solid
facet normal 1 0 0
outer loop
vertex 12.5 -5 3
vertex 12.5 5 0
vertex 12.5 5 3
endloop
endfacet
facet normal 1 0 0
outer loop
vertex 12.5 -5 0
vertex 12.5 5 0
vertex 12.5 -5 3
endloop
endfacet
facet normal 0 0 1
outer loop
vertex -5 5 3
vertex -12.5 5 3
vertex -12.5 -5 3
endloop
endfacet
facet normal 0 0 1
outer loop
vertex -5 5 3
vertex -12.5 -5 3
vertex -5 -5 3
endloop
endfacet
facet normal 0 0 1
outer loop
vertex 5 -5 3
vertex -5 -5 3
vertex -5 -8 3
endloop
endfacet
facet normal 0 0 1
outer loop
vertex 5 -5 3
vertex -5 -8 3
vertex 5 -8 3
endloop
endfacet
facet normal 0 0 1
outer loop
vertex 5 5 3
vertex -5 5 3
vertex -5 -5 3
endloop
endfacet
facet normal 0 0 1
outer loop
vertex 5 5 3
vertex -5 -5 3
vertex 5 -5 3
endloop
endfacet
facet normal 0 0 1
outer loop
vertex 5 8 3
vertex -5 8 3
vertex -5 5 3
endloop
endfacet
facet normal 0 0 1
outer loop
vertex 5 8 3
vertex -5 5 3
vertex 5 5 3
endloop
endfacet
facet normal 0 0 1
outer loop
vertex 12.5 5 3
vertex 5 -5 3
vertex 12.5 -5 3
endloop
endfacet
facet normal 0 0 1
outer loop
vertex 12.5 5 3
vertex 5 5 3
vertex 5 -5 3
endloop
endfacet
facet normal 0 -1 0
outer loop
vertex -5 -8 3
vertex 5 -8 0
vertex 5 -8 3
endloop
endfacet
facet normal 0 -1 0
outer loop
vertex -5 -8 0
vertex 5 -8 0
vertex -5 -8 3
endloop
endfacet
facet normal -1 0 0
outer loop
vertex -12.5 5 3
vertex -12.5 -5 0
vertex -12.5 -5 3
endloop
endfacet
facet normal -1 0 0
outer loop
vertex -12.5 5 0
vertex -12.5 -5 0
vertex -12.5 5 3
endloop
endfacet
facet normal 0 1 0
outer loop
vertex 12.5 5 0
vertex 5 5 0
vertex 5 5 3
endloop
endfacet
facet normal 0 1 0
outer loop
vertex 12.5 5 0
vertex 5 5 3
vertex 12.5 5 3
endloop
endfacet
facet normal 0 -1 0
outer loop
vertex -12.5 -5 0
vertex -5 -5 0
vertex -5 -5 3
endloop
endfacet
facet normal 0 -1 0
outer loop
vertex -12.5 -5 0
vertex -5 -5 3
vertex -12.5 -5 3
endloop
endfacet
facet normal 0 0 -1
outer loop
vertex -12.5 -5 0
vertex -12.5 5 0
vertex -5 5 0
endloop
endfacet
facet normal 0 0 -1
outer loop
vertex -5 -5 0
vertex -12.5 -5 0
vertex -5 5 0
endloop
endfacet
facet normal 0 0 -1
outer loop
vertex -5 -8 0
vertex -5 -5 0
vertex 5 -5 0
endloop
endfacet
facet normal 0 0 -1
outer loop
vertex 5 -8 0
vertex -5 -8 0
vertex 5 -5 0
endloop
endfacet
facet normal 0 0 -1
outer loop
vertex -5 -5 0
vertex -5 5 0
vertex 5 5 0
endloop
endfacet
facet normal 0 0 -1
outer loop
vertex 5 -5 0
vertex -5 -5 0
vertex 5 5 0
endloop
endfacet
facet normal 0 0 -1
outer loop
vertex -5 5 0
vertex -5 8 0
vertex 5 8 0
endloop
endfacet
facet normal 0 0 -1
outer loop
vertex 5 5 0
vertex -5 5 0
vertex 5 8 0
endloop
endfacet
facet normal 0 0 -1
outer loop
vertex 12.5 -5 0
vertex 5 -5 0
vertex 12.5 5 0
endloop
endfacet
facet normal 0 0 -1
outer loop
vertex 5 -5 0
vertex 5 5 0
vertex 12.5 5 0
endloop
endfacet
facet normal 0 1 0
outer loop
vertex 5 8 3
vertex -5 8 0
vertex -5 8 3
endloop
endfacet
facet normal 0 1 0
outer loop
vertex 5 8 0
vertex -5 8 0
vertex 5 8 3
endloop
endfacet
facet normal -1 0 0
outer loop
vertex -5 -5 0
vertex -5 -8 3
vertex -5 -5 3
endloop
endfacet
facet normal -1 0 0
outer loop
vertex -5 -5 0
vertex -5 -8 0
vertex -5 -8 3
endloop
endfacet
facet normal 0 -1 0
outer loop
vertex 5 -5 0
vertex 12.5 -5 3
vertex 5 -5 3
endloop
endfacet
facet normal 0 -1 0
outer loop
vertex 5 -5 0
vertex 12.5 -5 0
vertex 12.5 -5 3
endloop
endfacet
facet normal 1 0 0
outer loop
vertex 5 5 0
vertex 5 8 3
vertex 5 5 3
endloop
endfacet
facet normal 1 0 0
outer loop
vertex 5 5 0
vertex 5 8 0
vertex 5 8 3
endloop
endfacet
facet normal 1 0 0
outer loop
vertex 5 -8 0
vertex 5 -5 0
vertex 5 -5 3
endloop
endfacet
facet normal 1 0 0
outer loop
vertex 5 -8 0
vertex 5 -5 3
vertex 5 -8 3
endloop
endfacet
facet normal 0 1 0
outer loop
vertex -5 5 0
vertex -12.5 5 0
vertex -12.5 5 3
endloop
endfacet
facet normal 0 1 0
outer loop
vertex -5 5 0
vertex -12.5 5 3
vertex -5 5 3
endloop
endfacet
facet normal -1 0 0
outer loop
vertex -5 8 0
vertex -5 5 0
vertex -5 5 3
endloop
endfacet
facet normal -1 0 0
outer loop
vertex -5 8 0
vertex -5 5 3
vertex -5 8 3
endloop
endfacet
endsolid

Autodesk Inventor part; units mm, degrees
ref_plane "YZ Plane" through (0, 0, 0) normal (1, 0, 0) x (0, 1, 0)
ref_plane "XZ Plane" through (0, 0, 0) normal (0, 1, 0) x (-1, 0, 0)
ref_plane "XY Plane" through (0, 0, 0) normal (0, 0, 1) x (1, 0, 0)
sketch "Boceto1" plane through (0, 0, 0) normal (0, 0, 1) x (1, 0, 0)
  line L0 (-12.5, -5) -> (-12.5, 5)
  line L1 (-5, -5) -> (-12.5, -5)
  line L2 (-5, -8) -> (-5, -5)
  line L3 (5, -8) -> (-5, -8)
  line L4 (5, -5) -> (5, -8)
  line L5 (12.5, -5) -> (5, -5)
  line L6 (12.5, 5) -> (12.5, -5)
  line L7 (5, 5) -> (12.5, 5)
  line L8 (5, 8) -> (5, 5)
  line L9 (-5, 8) -> (5, 8)
  line L10 (-5, 5) -> (-5, 8)
  line L11 (-12.5, 5) -> (-5, 5)
  point P0 (0, 0)
  point P1 (12.5, -5)
  point P2 (5, 8)
extrude "Extrusión1" add sketch "Boceto1" along normal blind 3
properties part number "Case_Support" material "MDF Tablero de fibras de densidad media"
